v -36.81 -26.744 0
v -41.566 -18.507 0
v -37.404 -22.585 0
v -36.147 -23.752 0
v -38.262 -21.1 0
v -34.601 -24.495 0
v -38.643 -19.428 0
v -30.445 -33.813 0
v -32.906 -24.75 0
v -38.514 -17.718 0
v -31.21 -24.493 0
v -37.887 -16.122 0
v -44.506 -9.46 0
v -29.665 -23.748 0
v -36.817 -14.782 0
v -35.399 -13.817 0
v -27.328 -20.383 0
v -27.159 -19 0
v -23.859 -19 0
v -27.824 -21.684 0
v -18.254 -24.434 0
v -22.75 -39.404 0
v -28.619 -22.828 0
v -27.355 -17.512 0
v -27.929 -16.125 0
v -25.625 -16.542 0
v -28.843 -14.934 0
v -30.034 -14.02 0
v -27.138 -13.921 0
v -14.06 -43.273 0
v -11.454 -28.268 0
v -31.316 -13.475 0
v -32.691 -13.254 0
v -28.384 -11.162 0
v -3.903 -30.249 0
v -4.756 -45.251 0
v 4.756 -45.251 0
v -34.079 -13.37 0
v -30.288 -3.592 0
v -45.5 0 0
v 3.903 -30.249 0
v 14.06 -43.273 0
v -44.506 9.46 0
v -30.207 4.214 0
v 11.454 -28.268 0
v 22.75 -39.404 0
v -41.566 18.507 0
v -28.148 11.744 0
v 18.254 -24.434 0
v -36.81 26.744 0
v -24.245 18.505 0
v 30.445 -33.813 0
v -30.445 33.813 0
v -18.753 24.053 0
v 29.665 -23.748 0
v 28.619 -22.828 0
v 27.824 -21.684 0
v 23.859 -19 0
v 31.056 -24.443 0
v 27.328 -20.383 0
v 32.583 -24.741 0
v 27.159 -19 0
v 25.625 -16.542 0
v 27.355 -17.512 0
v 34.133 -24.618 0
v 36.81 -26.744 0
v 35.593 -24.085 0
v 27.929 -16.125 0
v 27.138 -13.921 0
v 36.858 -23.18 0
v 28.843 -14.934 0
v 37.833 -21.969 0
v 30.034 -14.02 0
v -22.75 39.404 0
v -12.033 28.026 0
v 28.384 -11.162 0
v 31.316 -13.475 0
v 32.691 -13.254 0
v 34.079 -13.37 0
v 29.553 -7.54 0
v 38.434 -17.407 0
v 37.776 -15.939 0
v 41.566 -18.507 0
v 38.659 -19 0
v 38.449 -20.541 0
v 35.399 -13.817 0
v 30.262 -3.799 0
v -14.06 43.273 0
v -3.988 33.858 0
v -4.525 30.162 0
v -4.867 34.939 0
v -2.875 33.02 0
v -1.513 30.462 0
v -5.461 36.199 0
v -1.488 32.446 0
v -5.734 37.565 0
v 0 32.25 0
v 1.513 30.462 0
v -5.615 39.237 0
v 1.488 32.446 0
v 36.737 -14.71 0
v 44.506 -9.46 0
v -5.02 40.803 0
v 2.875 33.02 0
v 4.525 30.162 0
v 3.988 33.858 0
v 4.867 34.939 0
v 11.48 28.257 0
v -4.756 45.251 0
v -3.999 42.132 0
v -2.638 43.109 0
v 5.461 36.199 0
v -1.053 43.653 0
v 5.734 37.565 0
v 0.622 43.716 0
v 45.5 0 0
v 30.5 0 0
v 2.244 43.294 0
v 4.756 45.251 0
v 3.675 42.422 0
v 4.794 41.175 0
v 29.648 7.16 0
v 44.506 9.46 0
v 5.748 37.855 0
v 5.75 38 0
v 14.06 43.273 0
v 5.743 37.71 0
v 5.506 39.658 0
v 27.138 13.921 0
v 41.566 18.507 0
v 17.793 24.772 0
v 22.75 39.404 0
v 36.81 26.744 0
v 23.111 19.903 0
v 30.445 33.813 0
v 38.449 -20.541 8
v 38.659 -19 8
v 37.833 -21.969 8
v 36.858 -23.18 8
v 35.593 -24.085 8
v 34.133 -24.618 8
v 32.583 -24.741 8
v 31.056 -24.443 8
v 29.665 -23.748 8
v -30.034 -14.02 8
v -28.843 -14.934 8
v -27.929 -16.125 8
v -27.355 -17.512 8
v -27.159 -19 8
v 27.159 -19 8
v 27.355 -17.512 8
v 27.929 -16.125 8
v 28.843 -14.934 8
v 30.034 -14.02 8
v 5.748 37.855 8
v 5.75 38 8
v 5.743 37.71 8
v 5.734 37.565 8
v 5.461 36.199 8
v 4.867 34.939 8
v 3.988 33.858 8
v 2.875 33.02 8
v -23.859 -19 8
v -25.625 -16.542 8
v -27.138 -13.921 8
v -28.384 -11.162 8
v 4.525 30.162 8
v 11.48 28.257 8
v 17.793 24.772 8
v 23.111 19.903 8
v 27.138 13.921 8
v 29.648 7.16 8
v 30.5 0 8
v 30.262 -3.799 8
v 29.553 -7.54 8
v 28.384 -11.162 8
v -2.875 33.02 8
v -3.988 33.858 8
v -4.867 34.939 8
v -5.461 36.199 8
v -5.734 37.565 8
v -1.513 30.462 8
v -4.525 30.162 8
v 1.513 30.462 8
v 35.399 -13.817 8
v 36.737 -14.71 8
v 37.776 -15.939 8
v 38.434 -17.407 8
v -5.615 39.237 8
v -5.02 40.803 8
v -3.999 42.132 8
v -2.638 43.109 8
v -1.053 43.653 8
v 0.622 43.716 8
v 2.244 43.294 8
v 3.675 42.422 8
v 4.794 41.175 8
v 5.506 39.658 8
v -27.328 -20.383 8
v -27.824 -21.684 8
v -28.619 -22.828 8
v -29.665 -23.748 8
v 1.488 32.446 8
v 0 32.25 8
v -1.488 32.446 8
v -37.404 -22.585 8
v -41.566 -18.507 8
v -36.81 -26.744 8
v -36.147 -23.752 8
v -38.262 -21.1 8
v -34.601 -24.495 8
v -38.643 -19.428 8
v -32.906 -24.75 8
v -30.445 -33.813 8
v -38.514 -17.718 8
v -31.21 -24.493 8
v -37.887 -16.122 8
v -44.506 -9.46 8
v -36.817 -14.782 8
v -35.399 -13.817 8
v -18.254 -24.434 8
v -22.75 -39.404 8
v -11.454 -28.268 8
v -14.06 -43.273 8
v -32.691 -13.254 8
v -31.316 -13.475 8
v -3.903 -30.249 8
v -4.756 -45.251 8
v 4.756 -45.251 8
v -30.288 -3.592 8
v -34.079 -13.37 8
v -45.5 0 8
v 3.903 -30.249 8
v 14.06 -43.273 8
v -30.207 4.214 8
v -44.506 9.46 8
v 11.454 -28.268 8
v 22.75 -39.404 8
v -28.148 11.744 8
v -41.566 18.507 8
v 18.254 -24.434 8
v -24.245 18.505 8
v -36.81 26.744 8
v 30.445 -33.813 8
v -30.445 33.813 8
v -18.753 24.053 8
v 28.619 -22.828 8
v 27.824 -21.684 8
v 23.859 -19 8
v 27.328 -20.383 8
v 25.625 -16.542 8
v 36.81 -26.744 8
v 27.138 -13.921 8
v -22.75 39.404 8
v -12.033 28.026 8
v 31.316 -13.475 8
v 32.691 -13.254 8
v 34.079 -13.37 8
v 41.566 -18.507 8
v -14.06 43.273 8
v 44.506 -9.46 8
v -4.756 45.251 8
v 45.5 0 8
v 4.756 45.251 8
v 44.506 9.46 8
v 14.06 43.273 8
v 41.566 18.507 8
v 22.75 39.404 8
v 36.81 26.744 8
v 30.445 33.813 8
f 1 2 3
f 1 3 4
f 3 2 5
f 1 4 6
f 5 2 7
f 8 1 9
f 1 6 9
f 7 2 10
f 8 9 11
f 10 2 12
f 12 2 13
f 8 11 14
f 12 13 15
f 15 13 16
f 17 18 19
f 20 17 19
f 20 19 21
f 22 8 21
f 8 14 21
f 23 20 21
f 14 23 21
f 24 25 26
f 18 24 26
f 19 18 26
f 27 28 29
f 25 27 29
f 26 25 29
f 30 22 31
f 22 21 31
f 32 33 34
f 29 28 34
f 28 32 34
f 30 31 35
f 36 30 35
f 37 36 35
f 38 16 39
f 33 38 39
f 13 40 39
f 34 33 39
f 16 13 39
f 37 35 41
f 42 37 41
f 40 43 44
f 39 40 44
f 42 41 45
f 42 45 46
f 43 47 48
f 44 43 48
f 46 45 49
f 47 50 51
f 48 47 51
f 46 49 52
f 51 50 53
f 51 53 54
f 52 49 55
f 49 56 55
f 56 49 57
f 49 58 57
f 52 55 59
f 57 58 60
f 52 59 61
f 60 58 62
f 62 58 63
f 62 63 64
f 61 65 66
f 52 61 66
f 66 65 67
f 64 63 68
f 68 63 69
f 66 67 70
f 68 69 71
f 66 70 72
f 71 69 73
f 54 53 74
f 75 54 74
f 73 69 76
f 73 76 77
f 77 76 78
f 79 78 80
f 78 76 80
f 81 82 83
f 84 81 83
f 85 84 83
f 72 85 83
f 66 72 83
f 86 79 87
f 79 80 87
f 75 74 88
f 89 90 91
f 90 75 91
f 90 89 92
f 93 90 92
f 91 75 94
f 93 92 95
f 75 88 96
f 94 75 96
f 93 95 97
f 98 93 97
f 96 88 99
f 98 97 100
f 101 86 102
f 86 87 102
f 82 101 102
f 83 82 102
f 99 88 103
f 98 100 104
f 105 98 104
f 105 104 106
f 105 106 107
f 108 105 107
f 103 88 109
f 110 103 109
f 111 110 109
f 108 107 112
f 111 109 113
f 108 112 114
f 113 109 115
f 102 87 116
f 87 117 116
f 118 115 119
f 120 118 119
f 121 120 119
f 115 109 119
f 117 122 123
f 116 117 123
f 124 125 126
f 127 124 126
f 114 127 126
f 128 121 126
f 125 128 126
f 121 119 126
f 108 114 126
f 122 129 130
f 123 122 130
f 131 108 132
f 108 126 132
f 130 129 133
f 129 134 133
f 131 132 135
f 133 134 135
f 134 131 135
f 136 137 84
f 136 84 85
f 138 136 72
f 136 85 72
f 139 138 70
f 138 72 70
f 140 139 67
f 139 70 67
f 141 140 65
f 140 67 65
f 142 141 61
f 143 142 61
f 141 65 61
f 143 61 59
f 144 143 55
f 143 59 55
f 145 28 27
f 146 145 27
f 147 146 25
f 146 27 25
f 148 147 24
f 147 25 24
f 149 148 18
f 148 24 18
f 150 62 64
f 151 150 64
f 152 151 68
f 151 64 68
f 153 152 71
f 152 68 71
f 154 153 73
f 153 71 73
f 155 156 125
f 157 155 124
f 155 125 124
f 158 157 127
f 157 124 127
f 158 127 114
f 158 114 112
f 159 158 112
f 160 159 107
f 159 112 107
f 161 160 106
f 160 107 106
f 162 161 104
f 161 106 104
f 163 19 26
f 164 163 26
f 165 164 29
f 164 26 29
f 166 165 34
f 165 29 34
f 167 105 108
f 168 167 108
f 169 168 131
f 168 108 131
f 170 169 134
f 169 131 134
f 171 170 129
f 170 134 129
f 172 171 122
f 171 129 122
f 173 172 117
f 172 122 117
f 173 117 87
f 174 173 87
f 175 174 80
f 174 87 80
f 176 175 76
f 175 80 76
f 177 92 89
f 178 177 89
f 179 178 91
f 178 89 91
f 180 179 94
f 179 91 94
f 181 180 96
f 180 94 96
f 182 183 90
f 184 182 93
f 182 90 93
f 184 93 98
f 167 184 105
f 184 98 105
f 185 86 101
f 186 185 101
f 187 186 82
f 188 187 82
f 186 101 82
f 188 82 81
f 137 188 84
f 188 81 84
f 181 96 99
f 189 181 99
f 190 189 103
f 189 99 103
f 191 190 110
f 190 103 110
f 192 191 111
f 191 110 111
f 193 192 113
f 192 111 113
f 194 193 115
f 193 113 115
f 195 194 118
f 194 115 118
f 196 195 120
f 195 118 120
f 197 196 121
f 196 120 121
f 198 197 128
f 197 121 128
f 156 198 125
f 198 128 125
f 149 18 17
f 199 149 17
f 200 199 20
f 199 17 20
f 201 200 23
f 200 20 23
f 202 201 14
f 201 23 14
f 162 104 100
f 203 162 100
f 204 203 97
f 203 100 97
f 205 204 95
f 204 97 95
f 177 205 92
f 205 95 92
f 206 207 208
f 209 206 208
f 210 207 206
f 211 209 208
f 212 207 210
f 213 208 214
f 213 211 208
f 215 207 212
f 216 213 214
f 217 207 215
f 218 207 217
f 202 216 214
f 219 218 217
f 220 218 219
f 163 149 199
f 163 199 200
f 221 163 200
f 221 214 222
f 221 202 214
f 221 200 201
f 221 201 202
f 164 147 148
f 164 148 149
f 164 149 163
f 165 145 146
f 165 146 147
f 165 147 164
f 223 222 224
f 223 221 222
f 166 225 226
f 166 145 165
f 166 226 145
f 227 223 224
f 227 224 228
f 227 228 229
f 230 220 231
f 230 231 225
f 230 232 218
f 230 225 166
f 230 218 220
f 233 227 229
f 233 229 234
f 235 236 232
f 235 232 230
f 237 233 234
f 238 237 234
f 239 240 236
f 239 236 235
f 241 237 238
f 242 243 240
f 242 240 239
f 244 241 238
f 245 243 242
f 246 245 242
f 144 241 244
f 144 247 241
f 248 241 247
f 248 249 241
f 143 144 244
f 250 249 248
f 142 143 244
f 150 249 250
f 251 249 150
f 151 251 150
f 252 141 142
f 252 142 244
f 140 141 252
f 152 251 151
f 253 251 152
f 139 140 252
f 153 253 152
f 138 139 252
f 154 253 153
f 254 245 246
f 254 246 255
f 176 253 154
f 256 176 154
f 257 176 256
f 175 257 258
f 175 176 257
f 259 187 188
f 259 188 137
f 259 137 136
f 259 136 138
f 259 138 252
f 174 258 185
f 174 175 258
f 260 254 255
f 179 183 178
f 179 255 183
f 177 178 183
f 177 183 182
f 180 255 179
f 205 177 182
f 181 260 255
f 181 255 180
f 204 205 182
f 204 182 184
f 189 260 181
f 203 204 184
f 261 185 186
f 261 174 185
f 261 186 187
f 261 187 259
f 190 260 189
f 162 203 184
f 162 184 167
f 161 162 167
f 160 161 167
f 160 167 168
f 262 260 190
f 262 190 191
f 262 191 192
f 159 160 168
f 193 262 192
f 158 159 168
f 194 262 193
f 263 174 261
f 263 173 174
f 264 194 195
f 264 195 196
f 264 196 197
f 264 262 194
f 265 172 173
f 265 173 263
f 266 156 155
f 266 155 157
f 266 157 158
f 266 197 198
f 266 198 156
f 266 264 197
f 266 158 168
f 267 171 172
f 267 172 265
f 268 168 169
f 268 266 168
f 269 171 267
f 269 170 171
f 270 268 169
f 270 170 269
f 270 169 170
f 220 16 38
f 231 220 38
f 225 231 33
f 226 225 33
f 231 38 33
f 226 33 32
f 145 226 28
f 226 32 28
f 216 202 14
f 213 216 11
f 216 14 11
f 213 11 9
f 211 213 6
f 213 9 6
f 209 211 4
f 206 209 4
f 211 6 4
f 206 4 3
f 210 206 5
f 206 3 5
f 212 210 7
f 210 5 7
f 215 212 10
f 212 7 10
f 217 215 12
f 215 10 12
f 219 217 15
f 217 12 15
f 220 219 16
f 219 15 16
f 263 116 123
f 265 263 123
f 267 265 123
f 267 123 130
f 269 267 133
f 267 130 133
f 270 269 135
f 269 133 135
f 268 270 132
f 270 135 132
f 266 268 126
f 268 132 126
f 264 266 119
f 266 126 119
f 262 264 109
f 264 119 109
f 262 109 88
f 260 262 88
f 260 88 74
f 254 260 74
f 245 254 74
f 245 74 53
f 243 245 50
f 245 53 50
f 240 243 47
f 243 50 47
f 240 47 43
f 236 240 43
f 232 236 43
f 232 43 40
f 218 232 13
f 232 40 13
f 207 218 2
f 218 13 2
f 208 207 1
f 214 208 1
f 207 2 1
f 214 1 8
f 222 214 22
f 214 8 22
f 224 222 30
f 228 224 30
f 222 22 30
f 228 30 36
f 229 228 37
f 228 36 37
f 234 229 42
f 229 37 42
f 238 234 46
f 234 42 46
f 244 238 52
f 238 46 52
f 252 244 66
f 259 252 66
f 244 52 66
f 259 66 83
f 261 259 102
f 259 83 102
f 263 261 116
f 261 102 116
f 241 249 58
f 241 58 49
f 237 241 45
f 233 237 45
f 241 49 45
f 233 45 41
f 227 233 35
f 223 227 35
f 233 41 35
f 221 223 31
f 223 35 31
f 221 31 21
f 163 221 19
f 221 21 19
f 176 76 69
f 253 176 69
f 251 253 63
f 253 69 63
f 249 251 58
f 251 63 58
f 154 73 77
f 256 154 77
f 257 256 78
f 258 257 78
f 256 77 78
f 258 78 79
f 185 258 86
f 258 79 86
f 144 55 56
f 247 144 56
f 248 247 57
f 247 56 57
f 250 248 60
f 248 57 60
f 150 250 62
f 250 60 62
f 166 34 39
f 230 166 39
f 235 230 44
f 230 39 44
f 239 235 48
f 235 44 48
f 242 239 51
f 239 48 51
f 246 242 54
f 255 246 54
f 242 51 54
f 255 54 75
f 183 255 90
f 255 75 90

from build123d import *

# Parameters (mm, degrees)
F0_R     = 45.5
F1_DEPTH = 8


with BuildPart() as f1:
    # F0 (on Top) → F1 (new body)
    with BuildSketch(Plane.XY):
        Circle(F0_R)
        with BuildLine():
            ThreePointArc((5.7335195457, 37.5649671053), (28.825975636, 24.7601116442), (38, 0))
            ThreePointArc((38, 0), (37.3440830117, -7.0298978664), (35.3989755783, -13.817109973))
            ThreePointArc((35.3989755783, -13.817109973), (37.7762057759, -15.9385509026), (38.6589653438, -19))
            ThreePointArc((38.6589653438, -19), (35.5933946557, -24.0849129068), (29.6654560327, -23.7478571323))
            ThreePointArc((29.6654560327, -23.7478571323), (0, -38), (-29.6654560327, -23.7478571323))
            ThreePointArc((-29.6654560327, -23.7478571323), (-37.8886114156, -21.875), (-35.3989755783, -13.817109973))
            ThreePointArc((-35.3989755783, -13.817109973), (-32.9089653438, 19), (-5.7335195457, 37.5649671053))
            ThreePointArc((-5.7335195457, 37.5649671053), (-0.2176724746, 43.7458784092), (5.75, 38))
            ThreePointArc((5.75, 38), (5.7458784092, 37.7823275254), (5.7335195457, 37.5649671053))
        make_face(mode=Mode.SUBTRACT)
        with BuildLine():
            ThreePointArc((35.3989755783, -13.817109973), (37.3440830117, -7.0298978664), (38, 0))
            ThreePointArc((38, 0), (28.825975636, 24.7601116442), (5.7335195457, 37.5649671053))
            ThreePointArc((5.7335195457, 37.5649671053), (4.8672404321, 34.9385509026), (2.875, 33.0203539282))
            Line((2.875, 33.0203539282), (4.5250023815, 30.1624659709))
            ThreePointArc((4.5250023815, 30.1624659709), (23.1112804993, 19.9027313121), (30.5, 0))
            ThreePointArc((30.5, 0), (29.9663216824, -5.6806306713), (28.3839629623, -11.1624659709))
            Line((28.3839629623, -11.1624659709), (30.0339653438, -14.0203539282))
            ThreePointArc((30.0339653438, -14.0203539282), (32.6912928692, -13.2541215908), (35.3989755783, -13.817109973))
        make_face()
        with BuildLine():
            ThreePointArc((-2.875, 33.0203539282), (-4.8672404321, 34.9385509026), (-5.7335195457, 37.5649671053))
            ThreePointArc((-5.7335195457, 37.5649671053), (-32.9089653438, 19), (-35.3989755783, -13.817109973))
            ThreePointArc((-35.3989755783, -13.817109973), (-32.6912928692, -13.2541215908), (-30.0339653438, -14.0203539282))
            Line((-30.0339653438, -14.0203539282), (-28.3839629623, -11.1624659709))
            ThreePointArc((-28.3839629623, -11.1624659709), (-26.4137748154, 15.25), (-4.5250023815, 30.1624659709))
            Line((-4.5250023815, 30.1624659709), (-2.875, 33.0203539282))
        make_face()
        with BuildLine():
            ThreePointArc((-29.6654560327, -23.7478571323), (0, -38), (29.6654560327, -23.7478571323))
            ThreePointArc((29.6654560327, -23.7478571323), (27.824052437, -21.6844293119), (27.1589653438, -19))
            Line((27.1589653438, -19), (23.8589605809, -19))
            ThreePointArc((23.8589605809, -19), (0, -30.5), (-23.8589605809, -19))
            Line((-23.8589605809, -19), (-27.1589653438, -19))
            ThreePointArc((-27.1589653438, -19), (-27.824052437, -21.6844293119), (-29.6654560327, -23.7478571323))
        make_face()
        with BuildLine():
            Line((4.5250023815, 30.1624659709), (2.875, 33.0203539282))
            ThreePointArc((2.875, 33.0203539282), (0, 32.25), (-2.875, 33.0203539282))
            Line((-2.875, 33.0203539282), (-4.5250023815, 30.1624659709))
            ThreePointArc((-4.5250023815, 30.1624659709), (0, 30.5), (4.5250023815, 30.1624659709))
        make_face()
        with BuildLine():
            ThreePointArc((27.1589653438, -19), (27.929319272, -16.125), (30.0339653438, -14.0203539282))
            Line((30.0339653438, -14.0203539282), (28.3839629623, -11.1624659709))
            ThreePointArc((28.3839629623, -11.1624659709), (26.4137748154, -15.25), (23.8589605809, -19))
            Line((23.8589605809, -19), (27.1589653438, -19))
        make_face()
        with BuildLine():
            Line((-28.3839629623, -11.1624659709), (-30.0339653438, -14.0203539282))
            ThreePointArc((-30.0339653438, -14.0203539282), (-27.929319272, -16.125), (-27.1589653438, -19))
            Line((-27.1589653438, -19), (-23.8589605809, -19))
            ThreePointArc((-23.8589605809, -19), (-26.4137748154, -15.25), (-28.3839629623, -11.1624659709))
        make_face()
    extrude(amount=F1_DEPTH)


solid = f1.part
